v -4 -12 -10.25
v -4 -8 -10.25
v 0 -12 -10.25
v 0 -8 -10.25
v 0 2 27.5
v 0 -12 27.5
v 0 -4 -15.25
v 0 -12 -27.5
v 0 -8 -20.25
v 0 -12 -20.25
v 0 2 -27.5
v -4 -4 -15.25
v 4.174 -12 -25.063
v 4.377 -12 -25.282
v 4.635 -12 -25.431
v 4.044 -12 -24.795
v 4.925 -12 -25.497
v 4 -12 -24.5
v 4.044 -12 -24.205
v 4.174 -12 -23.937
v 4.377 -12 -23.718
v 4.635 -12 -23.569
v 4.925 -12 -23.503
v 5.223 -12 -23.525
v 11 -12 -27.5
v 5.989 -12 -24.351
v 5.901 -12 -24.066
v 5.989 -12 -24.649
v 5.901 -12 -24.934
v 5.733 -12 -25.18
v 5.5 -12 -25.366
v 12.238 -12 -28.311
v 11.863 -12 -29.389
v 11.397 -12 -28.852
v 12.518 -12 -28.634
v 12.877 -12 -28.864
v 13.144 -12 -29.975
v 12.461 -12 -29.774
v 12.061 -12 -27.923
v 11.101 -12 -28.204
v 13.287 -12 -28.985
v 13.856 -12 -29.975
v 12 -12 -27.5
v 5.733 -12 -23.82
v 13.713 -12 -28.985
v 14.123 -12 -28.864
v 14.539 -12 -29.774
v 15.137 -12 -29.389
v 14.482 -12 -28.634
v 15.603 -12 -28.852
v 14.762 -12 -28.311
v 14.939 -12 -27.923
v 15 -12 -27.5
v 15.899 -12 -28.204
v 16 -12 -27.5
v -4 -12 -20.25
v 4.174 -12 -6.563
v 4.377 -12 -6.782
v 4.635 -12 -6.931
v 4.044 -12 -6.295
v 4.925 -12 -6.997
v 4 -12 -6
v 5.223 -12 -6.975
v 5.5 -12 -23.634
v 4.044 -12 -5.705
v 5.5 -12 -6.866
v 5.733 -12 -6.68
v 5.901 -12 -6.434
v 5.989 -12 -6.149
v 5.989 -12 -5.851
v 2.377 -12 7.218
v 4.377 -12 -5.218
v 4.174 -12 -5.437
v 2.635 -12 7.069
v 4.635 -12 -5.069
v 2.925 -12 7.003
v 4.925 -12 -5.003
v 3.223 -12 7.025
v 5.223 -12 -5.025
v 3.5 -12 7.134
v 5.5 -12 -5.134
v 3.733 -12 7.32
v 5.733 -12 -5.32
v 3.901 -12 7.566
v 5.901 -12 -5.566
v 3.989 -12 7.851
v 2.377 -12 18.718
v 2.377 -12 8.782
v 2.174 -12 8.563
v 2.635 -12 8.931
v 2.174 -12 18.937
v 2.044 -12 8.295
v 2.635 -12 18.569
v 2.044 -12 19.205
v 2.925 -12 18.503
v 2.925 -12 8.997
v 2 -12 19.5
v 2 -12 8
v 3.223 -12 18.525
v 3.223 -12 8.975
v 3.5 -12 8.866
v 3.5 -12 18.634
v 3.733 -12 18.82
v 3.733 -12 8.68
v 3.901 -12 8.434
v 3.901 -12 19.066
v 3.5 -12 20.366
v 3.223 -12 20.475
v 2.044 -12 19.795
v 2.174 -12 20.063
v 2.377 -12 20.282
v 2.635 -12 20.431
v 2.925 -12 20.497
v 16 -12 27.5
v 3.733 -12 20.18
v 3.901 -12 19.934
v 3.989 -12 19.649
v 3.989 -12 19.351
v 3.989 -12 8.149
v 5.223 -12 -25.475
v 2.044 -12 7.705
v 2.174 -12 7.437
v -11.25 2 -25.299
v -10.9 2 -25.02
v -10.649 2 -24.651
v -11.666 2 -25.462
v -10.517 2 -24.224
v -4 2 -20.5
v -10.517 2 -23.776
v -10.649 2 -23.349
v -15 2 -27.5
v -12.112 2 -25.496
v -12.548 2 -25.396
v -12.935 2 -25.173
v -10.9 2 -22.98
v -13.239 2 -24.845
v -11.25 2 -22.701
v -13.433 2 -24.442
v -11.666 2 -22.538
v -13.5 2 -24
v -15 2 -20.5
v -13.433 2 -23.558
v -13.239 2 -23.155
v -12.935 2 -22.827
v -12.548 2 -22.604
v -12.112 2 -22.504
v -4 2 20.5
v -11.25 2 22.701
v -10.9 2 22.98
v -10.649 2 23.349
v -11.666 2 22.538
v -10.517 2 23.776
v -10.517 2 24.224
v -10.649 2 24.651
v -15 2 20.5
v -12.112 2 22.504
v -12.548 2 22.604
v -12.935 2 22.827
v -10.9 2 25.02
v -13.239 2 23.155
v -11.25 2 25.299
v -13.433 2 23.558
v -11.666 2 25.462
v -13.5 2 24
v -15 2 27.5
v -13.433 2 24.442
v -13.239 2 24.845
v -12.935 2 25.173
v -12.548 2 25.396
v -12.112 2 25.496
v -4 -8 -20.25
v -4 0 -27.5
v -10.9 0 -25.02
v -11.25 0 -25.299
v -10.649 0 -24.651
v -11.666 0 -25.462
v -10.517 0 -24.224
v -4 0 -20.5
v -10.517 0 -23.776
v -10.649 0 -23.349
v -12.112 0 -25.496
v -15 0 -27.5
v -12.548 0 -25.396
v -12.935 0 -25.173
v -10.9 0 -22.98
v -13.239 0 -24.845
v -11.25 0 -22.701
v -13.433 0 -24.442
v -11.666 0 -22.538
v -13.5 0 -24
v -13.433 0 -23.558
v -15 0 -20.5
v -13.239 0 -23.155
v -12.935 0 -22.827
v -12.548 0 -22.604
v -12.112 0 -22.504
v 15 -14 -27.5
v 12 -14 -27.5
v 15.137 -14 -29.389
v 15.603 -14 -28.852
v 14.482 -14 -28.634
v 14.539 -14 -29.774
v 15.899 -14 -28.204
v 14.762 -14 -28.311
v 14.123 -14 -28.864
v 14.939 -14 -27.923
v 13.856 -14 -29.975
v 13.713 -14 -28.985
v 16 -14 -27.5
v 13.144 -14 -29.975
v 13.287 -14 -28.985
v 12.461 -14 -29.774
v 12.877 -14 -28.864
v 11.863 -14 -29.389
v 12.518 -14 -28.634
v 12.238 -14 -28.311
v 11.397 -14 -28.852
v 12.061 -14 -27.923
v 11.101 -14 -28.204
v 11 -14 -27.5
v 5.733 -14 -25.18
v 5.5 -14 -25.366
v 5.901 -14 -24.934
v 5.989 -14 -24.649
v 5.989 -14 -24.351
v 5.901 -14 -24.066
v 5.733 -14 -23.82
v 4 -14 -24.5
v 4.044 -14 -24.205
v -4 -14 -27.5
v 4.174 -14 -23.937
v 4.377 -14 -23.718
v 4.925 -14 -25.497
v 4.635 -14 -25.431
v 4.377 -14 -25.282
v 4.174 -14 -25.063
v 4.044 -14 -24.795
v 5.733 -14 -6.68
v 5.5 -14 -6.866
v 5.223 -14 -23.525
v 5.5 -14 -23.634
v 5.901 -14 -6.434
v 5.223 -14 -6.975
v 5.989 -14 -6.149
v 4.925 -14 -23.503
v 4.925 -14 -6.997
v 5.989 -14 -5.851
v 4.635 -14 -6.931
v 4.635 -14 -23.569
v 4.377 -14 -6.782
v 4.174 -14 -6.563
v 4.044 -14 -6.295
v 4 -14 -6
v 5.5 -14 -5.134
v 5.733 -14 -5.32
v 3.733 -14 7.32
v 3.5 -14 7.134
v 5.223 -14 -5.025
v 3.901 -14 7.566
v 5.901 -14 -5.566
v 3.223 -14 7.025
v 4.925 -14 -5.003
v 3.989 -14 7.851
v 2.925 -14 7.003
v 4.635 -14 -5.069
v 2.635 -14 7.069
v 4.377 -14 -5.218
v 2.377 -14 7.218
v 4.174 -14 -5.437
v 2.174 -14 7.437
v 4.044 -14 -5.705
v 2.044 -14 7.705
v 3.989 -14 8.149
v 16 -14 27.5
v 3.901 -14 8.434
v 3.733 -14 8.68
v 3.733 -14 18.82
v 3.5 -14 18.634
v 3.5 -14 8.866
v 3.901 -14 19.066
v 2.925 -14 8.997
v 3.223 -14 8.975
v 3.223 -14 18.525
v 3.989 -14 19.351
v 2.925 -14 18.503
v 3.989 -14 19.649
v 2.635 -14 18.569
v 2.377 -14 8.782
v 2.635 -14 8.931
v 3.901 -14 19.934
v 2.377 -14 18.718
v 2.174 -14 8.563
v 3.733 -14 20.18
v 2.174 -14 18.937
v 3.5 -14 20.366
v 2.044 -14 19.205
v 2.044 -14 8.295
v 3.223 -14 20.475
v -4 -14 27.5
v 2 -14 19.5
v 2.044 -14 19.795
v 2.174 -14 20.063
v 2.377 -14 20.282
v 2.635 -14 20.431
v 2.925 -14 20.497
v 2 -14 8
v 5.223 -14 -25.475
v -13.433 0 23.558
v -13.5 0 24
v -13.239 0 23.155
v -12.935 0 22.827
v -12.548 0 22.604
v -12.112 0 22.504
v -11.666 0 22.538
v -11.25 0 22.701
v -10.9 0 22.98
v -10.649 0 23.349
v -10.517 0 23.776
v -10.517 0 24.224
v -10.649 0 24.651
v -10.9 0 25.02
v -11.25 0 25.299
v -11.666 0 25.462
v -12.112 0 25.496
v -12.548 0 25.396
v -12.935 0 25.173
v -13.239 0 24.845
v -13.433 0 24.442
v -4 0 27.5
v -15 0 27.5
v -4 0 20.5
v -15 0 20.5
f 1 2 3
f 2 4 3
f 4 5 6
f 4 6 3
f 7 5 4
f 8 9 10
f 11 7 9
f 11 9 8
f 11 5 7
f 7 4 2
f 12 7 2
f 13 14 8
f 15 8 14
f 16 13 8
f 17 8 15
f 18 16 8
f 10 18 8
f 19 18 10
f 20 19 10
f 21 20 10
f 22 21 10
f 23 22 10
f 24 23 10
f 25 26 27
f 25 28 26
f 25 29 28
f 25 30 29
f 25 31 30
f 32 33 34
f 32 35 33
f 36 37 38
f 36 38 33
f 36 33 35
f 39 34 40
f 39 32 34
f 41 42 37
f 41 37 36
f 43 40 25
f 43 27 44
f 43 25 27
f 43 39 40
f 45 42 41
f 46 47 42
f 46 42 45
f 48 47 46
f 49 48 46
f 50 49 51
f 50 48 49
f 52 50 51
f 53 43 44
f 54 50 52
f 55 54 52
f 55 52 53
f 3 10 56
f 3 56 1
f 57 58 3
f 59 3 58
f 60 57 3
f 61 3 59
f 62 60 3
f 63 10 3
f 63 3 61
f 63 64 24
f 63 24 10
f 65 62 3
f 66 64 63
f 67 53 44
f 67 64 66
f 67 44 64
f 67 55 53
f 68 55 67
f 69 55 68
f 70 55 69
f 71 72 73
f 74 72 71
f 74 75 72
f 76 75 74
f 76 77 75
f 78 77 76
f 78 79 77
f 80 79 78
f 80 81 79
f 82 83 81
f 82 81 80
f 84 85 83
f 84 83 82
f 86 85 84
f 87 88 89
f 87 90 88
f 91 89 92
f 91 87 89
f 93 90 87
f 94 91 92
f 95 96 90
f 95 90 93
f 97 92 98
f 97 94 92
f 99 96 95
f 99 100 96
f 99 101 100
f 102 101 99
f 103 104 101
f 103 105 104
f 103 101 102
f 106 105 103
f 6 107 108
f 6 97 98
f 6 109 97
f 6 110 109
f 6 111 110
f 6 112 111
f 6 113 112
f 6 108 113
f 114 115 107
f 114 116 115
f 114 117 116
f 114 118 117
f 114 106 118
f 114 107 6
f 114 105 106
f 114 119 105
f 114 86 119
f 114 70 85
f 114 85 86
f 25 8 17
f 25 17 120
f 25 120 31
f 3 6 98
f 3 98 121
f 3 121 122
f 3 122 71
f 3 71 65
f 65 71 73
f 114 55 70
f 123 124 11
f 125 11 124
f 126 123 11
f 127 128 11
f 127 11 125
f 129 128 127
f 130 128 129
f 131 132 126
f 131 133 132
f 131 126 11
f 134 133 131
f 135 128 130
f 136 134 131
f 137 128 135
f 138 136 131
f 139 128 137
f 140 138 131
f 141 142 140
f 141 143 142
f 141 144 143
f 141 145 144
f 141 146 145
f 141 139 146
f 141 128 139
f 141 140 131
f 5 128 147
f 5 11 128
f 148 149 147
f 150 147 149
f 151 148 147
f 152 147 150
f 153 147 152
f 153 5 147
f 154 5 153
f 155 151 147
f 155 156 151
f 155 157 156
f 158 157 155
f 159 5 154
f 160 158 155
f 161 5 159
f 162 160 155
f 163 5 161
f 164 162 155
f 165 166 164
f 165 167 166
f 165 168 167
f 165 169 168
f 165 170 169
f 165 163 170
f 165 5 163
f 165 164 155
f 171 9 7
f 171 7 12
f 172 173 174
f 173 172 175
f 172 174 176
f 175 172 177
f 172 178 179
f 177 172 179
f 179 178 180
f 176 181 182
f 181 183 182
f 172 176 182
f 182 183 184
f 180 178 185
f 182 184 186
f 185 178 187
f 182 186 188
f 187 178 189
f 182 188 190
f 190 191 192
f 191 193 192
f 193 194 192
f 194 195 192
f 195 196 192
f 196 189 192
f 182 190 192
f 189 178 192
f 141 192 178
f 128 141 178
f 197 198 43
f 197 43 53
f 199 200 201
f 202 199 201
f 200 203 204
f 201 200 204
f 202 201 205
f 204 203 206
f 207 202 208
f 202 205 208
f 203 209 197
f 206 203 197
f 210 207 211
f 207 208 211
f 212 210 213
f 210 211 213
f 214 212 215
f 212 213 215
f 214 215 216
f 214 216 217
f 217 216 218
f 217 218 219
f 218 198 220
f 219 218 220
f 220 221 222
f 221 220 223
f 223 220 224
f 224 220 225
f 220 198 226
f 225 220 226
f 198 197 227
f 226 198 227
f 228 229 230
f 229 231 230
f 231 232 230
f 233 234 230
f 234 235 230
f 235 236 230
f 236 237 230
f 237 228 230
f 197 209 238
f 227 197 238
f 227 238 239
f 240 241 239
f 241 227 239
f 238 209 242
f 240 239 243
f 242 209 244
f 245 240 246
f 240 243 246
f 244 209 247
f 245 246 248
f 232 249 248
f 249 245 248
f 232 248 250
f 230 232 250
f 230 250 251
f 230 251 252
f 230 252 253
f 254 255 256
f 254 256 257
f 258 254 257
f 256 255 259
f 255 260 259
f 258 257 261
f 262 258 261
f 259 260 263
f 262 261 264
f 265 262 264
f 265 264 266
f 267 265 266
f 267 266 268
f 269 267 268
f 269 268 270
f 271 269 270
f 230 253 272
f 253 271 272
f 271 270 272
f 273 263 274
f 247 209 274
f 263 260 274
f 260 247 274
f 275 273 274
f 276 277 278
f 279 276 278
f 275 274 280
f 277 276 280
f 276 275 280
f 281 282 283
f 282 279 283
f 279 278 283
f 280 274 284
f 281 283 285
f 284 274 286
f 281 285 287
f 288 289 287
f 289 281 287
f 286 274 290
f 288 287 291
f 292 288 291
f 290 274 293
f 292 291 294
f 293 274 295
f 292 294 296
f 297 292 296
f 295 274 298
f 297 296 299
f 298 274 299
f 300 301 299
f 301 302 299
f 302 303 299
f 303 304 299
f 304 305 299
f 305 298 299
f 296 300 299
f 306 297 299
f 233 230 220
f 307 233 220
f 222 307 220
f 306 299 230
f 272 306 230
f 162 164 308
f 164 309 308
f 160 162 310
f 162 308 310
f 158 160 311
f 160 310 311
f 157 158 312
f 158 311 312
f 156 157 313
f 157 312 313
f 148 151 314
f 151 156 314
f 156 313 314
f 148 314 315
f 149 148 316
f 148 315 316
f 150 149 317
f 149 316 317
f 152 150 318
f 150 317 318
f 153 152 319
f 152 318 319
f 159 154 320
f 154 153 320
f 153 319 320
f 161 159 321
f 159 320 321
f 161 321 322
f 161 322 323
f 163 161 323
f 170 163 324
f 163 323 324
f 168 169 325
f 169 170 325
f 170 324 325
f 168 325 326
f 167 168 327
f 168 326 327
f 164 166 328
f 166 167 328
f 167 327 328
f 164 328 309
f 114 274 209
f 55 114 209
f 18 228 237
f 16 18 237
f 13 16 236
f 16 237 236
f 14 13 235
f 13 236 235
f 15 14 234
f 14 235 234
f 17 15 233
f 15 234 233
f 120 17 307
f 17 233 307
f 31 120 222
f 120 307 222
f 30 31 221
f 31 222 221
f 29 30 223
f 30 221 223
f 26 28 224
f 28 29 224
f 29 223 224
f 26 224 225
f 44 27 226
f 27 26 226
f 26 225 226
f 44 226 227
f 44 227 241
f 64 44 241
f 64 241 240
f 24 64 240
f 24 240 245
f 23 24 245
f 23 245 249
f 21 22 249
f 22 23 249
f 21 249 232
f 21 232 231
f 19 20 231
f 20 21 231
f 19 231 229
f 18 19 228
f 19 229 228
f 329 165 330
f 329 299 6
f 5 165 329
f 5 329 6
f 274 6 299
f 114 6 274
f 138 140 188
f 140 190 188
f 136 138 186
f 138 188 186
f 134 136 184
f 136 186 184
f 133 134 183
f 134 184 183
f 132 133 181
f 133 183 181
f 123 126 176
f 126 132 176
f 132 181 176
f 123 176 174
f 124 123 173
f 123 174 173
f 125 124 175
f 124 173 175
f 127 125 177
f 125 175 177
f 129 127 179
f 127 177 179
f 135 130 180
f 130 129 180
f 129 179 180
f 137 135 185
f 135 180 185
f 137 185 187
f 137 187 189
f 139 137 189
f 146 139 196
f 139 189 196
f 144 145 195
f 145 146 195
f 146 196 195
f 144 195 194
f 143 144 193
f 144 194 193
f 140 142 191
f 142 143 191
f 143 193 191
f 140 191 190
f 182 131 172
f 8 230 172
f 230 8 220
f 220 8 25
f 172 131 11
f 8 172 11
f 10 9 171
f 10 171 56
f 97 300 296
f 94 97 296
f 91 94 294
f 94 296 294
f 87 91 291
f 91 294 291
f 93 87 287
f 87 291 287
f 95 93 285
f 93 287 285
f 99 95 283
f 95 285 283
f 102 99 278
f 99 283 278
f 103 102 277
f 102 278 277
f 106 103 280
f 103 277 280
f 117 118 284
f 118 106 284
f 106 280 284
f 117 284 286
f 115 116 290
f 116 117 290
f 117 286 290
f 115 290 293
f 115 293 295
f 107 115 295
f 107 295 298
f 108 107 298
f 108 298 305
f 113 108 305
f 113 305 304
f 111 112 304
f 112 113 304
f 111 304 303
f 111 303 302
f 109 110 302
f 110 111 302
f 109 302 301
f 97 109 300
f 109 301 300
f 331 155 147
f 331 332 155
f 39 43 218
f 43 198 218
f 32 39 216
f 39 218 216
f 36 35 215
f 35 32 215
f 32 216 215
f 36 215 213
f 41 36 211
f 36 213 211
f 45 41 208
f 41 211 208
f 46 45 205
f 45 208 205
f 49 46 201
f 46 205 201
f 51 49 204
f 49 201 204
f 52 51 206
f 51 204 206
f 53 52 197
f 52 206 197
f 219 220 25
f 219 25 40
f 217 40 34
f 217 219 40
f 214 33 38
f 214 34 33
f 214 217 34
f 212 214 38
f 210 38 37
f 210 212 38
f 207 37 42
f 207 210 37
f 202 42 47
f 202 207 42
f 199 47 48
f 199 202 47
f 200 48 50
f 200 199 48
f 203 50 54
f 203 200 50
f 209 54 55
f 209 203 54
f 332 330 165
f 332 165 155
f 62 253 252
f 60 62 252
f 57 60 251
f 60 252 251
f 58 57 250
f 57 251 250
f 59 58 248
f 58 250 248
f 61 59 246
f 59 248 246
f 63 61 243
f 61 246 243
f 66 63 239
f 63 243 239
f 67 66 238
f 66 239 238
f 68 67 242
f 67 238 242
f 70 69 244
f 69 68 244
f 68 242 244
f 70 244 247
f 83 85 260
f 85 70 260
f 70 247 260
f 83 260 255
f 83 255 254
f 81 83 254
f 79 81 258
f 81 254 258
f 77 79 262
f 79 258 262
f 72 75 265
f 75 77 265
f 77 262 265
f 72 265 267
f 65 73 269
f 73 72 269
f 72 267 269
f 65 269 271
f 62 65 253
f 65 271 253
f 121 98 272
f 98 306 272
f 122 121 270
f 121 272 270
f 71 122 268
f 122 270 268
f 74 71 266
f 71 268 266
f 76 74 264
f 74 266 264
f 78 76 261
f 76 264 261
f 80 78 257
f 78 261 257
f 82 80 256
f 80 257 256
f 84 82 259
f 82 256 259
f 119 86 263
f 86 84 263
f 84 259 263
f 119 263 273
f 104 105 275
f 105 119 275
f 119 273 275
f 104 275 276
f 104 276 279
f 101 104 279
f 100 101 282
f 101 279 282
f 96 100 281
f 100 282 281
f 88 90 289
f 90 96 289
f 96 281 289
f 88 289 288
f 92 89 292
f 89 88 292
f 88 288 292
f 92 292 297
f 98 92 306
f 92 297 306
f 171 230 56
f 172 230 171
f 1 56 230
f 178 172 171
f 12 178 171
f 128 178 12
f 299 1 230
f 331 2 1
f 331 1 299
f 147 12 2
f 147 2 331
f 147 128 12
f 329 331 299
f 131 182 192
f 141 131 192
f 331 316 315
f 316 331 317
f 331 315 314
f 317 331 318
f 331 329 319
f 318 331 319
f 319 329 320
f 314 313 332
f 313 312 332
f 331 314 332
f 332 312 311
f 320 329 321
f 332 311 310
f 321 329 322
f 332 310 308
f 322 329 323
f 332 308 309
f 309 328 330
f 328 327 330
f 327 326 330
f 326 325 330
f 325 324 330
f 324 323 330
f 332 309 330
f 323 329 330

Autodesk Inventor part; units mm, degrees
ref_plane "YZ Plane" through (0, 0, 0) normal (1, 0, 0) x (0, 1, 0)
ref_plane "XZ Plane" through (0, 0, 0) normal (0, 1, 0) x (-1, 0, 0)
ref_plane "XY Plane" through (0, 0, 0) normal (0, 0, 1) x (1, 0, 0)
sketch "Sketch1" plane through (0, 0, 0) normal (0, 1, 0) x (-1, 0, 0)
  line L0 (0, 0) -> (12, 0) construction
  line L1 (12, 24) -> (12, -24) construction
  circle A0 centre (12, 24) radius 1.5
  circle A1 centre (12, -24) radius 1.5
  line L2 (15, 27.5) -> (15, 20.5)
  line L3 (15, 20.5) -> (4, 20.5)
  line L4 (4, 20.5) -> (4, 0)
  line L5 (15, 27.5) -> (-16, 27.5)
  line L6 (4, 0) -> (12, 0) construction
  line L7 (15, -27.5) -> (15, -20.5)
  line L8 (15, -20.5) -> (4, -20.5)
  line L9 (4, -20.5) -> (4, 0)
  line L10 (15, -27.5) -> (-16, -27.5)
  line L11 (12, 24) -> (15, 24) construction
  line L12 (-16, 27.5) -> (-16, -27.5)
  line L13 (0, 27.5) -> (0, -27.5)
  line L14 (4, 20.5) -> (4, 27.5)
  line L15 (4, -20.5) -> (4, -27.5)
  circle A2 centre (-3, 8) radius 1
  circle A3 centre (-3, 19.5) radius 1
  line L16 (-3, 8) -> (-3, 19.5) construction
  circle A4 centre (-5, -24.5) radius 1
  circle A5 centre (-5, -6) radius 1
  line L17 (-5, -24.5) -> (-5, -6) construction
  arc A6 (-16, -27.5) -> (-11, -27.5) centre (-13.5, -27.5) ccw
  arc A7 (-15, -27.5) -> (-12, -27.5) centre (-13.5, -27.5) ccw
  point P0 (-12, -27.5)
  dimension "d0" = 3
  dimension "d1" = 3
  dimension "d2" = 3
  dimension "d3" = 7
  dimension "d4" = 48
  dimension "d5" = 8
  dimension "d7" = 4
  dimension "d12" = 20
  dimension "d13" = 2
  dimension "d14" = 2
  dimension "d15" = 11.5
  dimension "d16" = 3
  dimension "d17" = 2
  dimension "d18" = 2
  dimension "d19" = 18.5
  dimension "d20" = 5
  dimension "d23" = 8
  dimension "d24" = 3
  dimension "d27" = 5
  dimension "d28" = 1
extrude "Extrusion1" add sketch "Sketch1" along normal blind 2 contours L2 L3 L14 L5 | L14 L4 L9 L15 L10 L13 L5 | L8 L7 L10 L15
extrude "Extrusion2" add sketch "Sketch1" against normal blind 14 contours L14 L4 L9 L15 L10 L13 L5
extrude "Extrusion3" add sketch "Sketch1" along normal blind 2 from surface at -14 contours L13 L10 L12 L5 | L10 A7 A6
sketch "Sketch2" plane through (0, 2, 27.5) normal (1, 0, 0) x (0, 0, -1)
  line L0 (55, -14) -> (0, -14) projected
  line L1 (55, -14) -> (55, 0) projected
  line L2 (0, 0) -> (55, 0) projected
  line L3 (0, -14) -> (0, 0) projected
  line L4 (32.5, -14) -> (34.5, -14) projected
  line L5 (51, -14) -> (53, -14) projected
  line L6 (33.5, -14) -> (52, -14)
  line L7 (42.75, -14) -> (42.75, -6) construction
  line L8 (42.75, -6) -> (37.75, -6)
  line L9 (37.75, -6) -> (37.75, -14)
  line L10 (42.75, -6) -> (47.75, -6)
  line L11 (47.75, -6) -> (47.75, -14)
  point P0 (27.5, -2)
  dimension "d29" = 10
  dimension "d30" = 8
extrude "Extrusion4" cut sketch "Sketch2" against normal through all contours L0 L9 L8 L10 L11
chamfer "Chamfer1" distance 5 distance2 4 2 edges at (-2, -4, -10.25) (-2, -4, -20.25) measured on face at (-2.6667, -4, -13.5833)
equation "\"d14\" = d13"
equation "\"d18\" = d17"
properties part number "adcDAcmount_3DPrint"
